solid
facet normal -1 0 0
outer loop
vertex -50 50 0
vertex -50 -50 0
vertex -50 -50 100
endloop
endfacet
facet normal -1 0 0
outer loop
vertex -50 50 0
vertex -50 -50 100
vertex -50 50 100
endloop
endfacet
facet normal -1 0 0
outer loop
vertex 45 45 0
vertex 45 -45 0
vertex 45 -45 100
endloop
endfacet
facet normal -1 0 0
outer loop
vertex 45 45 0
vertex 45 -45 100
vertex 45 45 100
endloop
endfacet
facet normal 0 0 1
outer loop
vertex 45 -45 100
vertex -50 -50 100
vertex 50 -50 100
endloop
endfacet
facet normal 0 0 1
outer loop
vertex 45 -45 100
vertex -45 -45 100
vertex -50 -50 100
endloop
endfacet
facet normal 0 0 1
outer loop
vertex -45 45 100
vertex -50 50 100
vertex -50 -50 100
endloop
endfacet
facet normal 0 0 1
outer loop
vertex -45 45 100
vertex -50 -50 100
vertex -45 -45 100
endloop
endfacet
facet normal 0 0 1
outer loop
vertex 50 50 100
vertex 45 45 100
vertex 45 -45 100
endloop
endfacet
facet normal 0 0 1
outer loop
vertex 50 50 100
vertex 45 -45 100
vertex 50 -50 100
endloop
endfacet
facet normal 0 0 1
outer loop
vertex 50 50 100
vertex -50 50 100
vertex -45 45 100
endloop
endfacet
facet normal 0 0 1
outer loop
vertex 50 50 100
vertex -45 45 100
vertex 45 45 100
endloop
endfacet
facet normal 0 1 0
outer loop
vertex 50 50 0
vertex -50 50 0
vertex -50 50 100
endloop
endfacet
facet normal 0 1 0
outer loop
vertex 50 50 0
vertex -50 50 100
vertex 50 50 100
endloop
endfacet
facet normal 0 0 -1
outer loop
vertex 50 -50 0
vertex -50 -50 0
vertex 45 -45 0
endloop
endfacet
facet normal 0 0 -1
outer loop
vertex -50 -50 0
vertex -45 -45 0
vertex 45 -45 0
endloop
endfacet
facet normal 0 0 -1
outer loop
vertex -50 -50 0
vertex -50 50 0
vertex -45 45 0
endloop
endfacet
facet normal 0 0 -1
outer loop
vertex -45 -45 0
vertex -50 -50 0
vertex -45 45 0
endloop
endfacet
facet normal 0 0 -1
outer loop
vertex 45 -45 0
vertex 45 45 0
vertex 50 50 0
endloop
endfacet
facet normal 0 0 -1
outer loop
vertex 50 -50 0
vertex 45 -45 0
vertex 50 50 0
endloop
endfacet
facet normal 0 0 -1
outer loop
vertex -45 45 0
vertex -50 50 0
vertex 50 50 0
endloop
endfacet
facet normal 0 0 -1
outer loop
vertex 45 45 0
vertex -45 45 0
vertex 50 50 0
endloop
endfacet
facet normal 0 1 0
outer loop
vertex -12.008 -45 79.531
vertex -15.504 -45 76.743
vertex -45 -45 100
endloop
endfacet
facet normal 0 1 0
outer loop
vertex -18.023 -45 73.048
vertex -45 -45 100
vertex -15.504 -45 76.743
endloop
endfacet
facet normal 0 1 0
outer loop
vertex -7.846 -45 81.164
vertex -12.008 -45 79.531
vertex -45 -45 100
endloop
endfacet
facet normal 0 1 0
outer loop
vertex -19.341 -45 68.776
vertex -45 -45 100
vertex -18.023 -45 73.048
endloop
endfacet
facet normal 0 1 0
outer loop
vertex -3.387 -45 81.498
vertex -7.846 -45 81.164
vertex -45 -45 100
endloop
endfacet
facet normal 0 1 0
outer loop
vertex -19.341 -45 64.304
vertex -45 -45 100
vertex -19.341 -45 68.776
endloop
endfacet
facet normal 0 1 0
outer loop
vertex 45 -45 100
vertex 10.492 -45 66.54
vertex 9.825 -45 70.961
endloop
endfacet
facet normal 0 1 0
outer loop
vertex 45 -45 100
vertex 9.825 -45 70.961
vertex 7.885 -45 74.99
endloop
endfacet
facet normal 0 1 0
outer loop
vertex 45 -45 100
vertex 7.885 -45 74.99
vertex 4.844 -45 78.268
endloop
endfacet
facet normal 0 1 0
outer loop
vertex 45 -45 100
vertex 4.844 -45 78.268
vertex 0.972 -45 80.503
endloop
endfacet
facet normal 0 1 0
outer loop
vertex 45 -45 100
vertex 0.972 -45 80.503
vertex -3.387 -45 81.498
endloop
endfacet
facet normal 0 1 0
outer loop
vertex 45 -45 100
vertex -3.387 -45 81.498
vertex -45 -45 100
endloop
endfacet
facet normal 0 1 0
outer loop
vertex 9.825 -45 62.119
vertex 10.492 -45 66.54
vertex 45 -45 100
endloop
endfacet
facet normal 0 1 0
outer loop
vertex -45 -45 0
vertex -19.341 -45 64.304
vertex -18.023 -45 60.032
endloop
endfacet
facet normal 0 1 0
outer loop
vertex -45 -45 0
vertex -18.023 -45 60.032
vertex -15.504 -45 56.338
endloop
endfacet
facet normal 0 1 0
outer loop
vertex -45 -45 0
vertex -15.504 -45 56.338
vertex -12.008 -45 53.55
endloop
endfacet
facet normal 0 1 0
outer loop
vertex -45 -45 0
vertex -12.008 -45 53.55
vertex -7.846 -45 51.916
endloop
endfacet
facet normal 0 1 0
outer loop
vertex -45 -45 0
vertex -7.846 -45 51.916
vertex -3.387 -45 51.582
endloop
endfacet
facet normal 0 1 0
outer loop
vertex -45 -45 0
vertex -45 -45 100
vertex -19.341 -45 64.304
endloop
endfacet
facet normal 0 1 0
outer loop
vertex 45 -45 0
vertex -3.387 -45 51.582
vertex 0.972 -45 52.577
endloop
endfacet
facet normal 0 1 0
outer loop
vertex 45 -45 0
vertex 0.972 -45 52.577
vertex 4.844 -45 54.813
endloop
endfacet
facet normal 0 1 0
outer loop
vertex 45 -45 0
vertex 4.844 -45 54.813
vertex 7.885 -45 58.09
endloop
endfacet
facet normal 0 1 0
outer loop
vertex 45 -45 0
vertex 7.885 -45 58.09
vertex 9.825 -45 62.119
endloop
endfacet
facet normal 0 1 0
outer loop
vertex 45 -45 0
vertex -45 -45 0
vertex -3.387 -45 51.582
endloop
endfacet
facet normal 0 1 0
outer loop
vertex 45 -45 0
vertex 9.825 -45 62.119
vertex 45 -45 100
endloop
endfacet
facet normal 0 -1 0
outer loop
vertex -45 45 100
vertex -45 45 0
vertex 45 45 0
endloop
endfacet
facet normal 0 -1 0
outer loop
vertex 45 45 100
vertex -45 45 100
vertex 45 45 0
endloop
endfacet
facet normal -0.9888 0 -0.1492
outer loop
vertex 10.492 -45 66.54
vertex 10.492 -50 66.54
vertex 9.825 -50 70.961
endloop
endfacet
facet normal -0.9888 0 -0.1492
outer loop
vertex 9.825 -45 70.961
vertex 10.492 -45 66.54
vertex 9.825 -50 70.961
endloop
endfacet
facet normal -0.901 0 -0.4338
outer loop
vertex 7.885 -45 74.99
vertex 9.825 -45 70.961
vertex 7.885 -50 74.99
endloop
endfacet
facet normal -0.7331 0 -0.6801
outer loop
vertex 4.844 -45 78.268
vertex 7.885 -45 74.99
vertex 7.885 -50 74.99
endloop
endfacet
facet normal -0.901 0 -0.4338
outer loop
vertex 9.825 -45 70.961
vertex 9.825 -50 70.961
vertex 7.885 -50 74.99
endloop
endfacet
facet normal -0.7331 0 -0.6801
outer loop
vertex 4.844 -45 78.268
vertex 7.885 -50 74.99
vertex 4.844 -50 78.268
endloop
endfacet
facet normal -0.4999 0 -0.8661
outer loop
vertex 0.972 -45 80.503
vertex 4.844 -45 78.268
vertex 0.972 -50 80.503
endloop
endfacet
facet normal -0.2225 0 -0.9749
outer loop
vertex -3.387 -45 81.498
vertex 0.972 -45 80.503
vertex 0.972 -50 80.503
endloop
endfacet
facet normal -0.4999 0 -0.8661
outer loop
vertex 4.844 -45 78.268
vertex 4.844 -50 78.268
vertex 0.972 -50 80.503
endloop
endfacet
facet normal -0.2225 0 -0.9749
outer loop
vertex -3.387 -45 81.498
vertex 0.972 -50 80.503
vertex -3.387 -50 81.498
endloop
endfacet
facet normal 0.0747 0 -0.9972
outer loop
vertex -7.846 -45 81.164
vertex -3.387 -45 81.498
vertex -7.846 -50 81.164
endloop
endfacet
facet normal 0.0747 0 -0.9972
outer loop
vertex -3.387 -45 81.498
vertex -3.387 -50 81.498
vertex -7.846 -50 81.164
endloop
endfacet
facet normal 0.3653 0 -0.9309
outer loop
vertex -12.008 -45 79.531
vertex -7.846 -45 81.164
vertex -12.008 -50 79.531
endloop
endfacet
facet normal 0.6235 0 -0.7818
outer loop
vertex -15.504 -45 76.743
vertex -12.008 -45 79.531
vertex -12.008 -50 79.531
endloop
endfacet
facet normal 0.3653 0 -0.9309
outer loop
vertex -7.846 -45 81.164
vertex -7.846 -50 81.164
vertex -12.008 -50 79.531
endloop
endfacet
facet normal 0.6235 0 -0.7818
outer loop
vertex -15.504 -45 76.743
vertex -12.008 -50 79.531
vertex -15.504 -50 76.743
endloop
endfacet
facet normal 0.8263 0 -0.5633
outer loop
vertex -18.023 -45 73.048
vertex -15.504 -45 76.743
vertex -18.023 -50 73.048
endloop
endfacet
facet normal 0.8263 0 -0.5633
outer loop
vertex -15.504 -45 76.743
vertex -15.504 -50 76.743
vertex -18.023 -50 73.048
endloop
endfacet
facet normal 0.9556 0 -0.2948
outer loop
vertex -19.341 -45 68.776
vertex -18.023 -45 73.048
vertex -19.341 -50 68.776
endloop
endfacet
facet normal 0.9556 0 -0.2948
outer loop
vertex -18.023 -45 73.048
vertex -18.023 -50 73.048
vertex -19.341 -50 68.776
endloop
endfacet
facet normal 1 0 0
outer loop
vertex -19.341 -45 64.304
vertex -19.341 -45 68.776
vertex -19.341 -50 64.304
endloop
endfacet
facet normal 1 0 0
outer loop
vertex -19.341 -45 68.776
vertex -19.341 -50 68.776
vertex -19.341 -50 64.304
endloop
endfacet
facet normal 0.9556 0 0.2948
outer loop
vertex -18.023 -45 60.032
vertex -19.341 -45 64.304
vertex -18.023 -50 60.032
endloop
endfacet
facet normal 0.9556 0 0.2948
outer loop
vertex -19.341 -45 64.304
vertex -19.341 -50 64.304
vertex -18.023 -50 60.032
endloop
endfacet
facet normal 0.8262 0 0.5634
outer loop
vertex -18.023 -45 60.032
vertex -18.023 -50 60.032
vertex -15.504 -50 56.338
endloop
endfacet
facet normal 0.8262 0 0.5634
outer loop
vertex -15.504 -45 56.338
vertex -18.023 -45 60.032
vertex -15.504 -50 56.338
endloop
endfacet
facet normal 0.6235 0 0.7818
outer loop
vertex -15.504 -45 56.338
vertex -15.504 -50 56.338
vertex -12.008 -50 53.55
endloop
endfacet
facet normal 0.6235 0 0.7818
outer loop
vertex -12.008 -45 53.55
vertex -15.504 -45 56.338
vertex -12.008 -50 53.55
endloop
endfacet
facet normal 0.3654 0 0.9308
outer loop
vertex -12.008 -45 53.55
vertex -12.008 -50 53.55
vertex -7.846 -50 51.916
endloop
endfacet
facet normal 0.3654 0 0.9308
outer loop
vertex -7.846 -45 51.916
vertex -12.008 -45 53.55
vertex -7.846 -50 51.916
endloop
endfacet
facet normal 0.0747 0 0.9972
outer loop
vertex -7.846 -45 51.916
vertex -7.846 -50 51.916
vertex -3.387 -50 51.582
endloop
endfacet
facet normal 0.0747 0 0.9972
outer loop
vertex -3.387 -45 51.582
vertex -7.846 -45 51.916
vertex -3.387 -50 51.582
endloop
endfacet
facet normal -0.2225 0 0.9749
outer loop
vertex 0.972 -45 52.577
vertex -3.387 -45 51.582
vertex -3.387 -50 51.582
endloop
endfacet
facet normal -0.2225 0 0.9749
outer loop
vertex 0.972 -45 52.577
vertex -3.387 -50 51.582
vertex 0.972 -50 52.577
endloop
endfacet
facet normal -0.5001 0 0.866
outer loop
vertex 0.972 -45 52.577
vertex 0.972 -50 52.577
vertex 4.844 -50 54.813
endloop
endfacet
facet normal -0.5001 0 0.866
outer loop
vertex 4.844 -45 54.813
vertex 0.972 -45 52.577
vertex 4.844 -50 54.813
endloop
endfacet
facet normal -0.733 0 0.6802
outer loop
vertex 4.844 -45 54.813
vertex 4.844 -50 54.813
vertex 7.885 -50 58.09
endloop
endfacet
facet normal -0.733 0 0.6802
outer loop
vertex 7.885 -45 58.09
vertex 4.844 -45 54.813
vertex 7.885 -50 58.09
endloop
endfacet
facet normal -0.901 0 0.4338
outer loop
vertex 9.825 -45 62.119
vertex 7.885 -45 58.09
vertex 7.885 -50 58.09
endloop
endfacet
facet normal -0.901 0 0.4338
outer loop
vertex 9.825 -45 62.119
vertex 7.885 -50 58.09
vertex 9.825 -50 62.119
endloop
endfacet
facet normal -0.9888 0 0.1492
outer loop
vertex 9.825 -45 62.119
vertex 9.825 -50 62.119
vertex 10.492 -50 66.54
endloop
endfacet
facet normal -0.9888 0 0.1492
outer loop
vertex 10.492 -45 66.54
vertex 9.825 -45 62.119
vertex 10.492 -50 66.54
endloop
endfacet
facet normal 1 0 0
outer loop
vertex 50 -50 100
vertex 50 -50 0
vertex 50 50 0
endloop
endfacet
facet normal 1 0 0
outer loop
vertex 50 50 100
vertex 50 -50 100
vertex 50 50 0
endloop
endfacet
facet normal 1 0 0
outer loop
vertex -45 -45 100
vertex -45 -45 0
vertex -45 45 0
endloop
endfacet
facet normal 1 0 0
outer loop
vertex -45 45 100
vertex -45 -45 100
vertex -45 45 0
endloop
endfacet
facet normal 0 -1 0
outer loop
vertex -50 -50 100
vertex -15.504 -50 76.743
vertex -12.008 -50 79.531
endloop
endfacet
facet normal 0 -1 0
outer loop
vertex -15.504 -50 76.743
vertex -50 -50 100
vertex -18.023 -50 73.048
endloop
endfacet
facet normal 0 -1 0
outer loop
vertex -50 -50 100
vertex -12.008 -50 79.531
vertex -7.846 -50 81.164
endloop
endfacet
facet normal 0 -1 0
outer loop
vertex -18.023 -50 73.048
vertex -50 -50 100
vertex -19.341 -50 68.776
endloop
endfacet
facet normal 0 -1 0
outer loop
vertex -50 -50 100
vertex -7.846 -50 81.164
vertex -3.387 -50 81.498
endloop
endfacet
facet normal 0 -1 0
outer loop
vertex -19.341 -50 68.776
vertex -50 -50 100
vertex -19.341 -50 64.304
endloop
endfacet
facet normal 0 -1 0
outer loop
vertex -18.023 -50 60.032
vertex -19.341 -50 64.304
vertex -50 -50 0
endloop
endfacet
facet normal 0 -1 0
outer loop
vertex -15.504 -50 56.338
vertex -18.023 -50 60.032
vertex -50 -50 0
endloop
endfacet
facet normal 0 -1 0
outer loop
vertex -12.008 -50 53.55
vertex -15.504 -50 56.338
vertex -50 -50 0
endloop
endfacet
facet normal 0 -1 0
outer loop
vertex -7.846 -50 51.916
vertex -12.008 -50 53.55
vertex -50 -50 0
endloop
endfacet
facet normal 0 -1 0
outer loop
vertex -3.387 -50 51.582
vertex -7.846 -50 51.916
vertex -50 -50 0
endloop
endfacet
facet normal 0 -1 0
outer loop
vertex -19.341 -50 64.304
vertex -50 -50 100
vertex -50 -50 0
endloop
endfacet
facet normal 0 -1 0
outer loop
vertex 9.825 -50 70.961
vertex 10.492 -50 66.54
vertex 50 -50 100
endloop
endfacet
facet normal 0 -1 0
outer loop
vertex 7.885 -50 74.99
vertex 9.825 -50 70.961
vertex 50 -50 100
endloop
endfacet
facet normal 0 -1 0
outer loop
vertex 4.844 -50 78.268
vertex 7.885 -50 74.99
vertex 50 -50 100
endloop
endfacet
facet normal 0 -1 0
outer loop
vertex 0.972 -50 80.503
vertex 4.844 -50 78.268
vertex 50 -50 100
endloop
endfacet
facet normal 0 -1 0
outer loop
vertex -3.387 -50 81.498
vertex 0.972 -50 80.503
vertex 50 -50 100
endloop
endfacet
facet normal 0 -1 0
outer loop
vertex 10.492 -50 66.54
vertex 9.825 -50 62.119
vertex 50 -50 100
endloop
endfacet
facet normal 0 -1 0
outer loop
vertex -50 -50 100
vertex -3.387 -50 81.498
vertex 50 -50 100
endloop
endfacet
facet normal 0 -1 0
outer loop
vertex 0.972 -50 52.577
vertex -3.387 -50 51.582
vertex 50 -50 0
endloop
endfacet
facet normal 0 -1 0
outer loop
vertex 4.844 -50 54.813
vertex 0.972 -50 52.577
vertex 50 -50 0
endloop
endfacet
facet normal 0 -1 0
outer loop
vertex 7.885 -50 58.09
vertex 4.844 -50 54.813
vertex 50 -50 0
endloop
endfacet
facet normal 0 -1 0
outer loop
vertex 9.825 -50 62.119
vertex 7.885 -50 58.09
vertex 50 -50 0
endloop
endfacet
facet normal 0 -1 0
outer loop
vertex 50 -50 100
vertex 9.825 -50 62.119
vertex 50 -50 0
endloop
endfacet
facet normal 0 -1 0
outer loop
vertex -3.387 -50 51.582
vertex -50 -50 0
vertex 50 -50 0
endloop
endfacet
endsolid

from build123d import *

# Parameters (mm, degrees)
F0_W     = 100
F0_H     = 100
F0_W_2   = 90
F0_H_2   = 90
F1_DEPTH = 100
F2_R     = 15
F3_DEPTH = 10
F4_R     = 15
F5_DEPTH = 25


with BuildPart() as f1:
    # F0 (on Top) → F1 (new body)
    with BuildSketch(Plane.XY):
        Rectangle(F0_W, F0_H)
        Rectangle(F0_W_2, F0_H_2, mode=Mode.SUBTRACT)
    extrude(amount=F1_DEPTH)

    # F2 (on face) → F3 (cut)
    with BuildSketch(Plane.XZ.offset(50)):
        with Locations((-4.887418, 68.32698)):
            Circle(F2_R)
    extrude(amount=F3_DEPTH, mode=Mode.SUBTRACT)

    # F4 (on face) → F5 (cut)
    with BuildSketch(Plane.XZ.offset(50)):
        with Locations((-4.508148, 66.540122)):
            Circle(F4_R)
    extrude(amount=-F5_DEPTH, mode=Mode.SUBTRACT)


solid = f1.part
